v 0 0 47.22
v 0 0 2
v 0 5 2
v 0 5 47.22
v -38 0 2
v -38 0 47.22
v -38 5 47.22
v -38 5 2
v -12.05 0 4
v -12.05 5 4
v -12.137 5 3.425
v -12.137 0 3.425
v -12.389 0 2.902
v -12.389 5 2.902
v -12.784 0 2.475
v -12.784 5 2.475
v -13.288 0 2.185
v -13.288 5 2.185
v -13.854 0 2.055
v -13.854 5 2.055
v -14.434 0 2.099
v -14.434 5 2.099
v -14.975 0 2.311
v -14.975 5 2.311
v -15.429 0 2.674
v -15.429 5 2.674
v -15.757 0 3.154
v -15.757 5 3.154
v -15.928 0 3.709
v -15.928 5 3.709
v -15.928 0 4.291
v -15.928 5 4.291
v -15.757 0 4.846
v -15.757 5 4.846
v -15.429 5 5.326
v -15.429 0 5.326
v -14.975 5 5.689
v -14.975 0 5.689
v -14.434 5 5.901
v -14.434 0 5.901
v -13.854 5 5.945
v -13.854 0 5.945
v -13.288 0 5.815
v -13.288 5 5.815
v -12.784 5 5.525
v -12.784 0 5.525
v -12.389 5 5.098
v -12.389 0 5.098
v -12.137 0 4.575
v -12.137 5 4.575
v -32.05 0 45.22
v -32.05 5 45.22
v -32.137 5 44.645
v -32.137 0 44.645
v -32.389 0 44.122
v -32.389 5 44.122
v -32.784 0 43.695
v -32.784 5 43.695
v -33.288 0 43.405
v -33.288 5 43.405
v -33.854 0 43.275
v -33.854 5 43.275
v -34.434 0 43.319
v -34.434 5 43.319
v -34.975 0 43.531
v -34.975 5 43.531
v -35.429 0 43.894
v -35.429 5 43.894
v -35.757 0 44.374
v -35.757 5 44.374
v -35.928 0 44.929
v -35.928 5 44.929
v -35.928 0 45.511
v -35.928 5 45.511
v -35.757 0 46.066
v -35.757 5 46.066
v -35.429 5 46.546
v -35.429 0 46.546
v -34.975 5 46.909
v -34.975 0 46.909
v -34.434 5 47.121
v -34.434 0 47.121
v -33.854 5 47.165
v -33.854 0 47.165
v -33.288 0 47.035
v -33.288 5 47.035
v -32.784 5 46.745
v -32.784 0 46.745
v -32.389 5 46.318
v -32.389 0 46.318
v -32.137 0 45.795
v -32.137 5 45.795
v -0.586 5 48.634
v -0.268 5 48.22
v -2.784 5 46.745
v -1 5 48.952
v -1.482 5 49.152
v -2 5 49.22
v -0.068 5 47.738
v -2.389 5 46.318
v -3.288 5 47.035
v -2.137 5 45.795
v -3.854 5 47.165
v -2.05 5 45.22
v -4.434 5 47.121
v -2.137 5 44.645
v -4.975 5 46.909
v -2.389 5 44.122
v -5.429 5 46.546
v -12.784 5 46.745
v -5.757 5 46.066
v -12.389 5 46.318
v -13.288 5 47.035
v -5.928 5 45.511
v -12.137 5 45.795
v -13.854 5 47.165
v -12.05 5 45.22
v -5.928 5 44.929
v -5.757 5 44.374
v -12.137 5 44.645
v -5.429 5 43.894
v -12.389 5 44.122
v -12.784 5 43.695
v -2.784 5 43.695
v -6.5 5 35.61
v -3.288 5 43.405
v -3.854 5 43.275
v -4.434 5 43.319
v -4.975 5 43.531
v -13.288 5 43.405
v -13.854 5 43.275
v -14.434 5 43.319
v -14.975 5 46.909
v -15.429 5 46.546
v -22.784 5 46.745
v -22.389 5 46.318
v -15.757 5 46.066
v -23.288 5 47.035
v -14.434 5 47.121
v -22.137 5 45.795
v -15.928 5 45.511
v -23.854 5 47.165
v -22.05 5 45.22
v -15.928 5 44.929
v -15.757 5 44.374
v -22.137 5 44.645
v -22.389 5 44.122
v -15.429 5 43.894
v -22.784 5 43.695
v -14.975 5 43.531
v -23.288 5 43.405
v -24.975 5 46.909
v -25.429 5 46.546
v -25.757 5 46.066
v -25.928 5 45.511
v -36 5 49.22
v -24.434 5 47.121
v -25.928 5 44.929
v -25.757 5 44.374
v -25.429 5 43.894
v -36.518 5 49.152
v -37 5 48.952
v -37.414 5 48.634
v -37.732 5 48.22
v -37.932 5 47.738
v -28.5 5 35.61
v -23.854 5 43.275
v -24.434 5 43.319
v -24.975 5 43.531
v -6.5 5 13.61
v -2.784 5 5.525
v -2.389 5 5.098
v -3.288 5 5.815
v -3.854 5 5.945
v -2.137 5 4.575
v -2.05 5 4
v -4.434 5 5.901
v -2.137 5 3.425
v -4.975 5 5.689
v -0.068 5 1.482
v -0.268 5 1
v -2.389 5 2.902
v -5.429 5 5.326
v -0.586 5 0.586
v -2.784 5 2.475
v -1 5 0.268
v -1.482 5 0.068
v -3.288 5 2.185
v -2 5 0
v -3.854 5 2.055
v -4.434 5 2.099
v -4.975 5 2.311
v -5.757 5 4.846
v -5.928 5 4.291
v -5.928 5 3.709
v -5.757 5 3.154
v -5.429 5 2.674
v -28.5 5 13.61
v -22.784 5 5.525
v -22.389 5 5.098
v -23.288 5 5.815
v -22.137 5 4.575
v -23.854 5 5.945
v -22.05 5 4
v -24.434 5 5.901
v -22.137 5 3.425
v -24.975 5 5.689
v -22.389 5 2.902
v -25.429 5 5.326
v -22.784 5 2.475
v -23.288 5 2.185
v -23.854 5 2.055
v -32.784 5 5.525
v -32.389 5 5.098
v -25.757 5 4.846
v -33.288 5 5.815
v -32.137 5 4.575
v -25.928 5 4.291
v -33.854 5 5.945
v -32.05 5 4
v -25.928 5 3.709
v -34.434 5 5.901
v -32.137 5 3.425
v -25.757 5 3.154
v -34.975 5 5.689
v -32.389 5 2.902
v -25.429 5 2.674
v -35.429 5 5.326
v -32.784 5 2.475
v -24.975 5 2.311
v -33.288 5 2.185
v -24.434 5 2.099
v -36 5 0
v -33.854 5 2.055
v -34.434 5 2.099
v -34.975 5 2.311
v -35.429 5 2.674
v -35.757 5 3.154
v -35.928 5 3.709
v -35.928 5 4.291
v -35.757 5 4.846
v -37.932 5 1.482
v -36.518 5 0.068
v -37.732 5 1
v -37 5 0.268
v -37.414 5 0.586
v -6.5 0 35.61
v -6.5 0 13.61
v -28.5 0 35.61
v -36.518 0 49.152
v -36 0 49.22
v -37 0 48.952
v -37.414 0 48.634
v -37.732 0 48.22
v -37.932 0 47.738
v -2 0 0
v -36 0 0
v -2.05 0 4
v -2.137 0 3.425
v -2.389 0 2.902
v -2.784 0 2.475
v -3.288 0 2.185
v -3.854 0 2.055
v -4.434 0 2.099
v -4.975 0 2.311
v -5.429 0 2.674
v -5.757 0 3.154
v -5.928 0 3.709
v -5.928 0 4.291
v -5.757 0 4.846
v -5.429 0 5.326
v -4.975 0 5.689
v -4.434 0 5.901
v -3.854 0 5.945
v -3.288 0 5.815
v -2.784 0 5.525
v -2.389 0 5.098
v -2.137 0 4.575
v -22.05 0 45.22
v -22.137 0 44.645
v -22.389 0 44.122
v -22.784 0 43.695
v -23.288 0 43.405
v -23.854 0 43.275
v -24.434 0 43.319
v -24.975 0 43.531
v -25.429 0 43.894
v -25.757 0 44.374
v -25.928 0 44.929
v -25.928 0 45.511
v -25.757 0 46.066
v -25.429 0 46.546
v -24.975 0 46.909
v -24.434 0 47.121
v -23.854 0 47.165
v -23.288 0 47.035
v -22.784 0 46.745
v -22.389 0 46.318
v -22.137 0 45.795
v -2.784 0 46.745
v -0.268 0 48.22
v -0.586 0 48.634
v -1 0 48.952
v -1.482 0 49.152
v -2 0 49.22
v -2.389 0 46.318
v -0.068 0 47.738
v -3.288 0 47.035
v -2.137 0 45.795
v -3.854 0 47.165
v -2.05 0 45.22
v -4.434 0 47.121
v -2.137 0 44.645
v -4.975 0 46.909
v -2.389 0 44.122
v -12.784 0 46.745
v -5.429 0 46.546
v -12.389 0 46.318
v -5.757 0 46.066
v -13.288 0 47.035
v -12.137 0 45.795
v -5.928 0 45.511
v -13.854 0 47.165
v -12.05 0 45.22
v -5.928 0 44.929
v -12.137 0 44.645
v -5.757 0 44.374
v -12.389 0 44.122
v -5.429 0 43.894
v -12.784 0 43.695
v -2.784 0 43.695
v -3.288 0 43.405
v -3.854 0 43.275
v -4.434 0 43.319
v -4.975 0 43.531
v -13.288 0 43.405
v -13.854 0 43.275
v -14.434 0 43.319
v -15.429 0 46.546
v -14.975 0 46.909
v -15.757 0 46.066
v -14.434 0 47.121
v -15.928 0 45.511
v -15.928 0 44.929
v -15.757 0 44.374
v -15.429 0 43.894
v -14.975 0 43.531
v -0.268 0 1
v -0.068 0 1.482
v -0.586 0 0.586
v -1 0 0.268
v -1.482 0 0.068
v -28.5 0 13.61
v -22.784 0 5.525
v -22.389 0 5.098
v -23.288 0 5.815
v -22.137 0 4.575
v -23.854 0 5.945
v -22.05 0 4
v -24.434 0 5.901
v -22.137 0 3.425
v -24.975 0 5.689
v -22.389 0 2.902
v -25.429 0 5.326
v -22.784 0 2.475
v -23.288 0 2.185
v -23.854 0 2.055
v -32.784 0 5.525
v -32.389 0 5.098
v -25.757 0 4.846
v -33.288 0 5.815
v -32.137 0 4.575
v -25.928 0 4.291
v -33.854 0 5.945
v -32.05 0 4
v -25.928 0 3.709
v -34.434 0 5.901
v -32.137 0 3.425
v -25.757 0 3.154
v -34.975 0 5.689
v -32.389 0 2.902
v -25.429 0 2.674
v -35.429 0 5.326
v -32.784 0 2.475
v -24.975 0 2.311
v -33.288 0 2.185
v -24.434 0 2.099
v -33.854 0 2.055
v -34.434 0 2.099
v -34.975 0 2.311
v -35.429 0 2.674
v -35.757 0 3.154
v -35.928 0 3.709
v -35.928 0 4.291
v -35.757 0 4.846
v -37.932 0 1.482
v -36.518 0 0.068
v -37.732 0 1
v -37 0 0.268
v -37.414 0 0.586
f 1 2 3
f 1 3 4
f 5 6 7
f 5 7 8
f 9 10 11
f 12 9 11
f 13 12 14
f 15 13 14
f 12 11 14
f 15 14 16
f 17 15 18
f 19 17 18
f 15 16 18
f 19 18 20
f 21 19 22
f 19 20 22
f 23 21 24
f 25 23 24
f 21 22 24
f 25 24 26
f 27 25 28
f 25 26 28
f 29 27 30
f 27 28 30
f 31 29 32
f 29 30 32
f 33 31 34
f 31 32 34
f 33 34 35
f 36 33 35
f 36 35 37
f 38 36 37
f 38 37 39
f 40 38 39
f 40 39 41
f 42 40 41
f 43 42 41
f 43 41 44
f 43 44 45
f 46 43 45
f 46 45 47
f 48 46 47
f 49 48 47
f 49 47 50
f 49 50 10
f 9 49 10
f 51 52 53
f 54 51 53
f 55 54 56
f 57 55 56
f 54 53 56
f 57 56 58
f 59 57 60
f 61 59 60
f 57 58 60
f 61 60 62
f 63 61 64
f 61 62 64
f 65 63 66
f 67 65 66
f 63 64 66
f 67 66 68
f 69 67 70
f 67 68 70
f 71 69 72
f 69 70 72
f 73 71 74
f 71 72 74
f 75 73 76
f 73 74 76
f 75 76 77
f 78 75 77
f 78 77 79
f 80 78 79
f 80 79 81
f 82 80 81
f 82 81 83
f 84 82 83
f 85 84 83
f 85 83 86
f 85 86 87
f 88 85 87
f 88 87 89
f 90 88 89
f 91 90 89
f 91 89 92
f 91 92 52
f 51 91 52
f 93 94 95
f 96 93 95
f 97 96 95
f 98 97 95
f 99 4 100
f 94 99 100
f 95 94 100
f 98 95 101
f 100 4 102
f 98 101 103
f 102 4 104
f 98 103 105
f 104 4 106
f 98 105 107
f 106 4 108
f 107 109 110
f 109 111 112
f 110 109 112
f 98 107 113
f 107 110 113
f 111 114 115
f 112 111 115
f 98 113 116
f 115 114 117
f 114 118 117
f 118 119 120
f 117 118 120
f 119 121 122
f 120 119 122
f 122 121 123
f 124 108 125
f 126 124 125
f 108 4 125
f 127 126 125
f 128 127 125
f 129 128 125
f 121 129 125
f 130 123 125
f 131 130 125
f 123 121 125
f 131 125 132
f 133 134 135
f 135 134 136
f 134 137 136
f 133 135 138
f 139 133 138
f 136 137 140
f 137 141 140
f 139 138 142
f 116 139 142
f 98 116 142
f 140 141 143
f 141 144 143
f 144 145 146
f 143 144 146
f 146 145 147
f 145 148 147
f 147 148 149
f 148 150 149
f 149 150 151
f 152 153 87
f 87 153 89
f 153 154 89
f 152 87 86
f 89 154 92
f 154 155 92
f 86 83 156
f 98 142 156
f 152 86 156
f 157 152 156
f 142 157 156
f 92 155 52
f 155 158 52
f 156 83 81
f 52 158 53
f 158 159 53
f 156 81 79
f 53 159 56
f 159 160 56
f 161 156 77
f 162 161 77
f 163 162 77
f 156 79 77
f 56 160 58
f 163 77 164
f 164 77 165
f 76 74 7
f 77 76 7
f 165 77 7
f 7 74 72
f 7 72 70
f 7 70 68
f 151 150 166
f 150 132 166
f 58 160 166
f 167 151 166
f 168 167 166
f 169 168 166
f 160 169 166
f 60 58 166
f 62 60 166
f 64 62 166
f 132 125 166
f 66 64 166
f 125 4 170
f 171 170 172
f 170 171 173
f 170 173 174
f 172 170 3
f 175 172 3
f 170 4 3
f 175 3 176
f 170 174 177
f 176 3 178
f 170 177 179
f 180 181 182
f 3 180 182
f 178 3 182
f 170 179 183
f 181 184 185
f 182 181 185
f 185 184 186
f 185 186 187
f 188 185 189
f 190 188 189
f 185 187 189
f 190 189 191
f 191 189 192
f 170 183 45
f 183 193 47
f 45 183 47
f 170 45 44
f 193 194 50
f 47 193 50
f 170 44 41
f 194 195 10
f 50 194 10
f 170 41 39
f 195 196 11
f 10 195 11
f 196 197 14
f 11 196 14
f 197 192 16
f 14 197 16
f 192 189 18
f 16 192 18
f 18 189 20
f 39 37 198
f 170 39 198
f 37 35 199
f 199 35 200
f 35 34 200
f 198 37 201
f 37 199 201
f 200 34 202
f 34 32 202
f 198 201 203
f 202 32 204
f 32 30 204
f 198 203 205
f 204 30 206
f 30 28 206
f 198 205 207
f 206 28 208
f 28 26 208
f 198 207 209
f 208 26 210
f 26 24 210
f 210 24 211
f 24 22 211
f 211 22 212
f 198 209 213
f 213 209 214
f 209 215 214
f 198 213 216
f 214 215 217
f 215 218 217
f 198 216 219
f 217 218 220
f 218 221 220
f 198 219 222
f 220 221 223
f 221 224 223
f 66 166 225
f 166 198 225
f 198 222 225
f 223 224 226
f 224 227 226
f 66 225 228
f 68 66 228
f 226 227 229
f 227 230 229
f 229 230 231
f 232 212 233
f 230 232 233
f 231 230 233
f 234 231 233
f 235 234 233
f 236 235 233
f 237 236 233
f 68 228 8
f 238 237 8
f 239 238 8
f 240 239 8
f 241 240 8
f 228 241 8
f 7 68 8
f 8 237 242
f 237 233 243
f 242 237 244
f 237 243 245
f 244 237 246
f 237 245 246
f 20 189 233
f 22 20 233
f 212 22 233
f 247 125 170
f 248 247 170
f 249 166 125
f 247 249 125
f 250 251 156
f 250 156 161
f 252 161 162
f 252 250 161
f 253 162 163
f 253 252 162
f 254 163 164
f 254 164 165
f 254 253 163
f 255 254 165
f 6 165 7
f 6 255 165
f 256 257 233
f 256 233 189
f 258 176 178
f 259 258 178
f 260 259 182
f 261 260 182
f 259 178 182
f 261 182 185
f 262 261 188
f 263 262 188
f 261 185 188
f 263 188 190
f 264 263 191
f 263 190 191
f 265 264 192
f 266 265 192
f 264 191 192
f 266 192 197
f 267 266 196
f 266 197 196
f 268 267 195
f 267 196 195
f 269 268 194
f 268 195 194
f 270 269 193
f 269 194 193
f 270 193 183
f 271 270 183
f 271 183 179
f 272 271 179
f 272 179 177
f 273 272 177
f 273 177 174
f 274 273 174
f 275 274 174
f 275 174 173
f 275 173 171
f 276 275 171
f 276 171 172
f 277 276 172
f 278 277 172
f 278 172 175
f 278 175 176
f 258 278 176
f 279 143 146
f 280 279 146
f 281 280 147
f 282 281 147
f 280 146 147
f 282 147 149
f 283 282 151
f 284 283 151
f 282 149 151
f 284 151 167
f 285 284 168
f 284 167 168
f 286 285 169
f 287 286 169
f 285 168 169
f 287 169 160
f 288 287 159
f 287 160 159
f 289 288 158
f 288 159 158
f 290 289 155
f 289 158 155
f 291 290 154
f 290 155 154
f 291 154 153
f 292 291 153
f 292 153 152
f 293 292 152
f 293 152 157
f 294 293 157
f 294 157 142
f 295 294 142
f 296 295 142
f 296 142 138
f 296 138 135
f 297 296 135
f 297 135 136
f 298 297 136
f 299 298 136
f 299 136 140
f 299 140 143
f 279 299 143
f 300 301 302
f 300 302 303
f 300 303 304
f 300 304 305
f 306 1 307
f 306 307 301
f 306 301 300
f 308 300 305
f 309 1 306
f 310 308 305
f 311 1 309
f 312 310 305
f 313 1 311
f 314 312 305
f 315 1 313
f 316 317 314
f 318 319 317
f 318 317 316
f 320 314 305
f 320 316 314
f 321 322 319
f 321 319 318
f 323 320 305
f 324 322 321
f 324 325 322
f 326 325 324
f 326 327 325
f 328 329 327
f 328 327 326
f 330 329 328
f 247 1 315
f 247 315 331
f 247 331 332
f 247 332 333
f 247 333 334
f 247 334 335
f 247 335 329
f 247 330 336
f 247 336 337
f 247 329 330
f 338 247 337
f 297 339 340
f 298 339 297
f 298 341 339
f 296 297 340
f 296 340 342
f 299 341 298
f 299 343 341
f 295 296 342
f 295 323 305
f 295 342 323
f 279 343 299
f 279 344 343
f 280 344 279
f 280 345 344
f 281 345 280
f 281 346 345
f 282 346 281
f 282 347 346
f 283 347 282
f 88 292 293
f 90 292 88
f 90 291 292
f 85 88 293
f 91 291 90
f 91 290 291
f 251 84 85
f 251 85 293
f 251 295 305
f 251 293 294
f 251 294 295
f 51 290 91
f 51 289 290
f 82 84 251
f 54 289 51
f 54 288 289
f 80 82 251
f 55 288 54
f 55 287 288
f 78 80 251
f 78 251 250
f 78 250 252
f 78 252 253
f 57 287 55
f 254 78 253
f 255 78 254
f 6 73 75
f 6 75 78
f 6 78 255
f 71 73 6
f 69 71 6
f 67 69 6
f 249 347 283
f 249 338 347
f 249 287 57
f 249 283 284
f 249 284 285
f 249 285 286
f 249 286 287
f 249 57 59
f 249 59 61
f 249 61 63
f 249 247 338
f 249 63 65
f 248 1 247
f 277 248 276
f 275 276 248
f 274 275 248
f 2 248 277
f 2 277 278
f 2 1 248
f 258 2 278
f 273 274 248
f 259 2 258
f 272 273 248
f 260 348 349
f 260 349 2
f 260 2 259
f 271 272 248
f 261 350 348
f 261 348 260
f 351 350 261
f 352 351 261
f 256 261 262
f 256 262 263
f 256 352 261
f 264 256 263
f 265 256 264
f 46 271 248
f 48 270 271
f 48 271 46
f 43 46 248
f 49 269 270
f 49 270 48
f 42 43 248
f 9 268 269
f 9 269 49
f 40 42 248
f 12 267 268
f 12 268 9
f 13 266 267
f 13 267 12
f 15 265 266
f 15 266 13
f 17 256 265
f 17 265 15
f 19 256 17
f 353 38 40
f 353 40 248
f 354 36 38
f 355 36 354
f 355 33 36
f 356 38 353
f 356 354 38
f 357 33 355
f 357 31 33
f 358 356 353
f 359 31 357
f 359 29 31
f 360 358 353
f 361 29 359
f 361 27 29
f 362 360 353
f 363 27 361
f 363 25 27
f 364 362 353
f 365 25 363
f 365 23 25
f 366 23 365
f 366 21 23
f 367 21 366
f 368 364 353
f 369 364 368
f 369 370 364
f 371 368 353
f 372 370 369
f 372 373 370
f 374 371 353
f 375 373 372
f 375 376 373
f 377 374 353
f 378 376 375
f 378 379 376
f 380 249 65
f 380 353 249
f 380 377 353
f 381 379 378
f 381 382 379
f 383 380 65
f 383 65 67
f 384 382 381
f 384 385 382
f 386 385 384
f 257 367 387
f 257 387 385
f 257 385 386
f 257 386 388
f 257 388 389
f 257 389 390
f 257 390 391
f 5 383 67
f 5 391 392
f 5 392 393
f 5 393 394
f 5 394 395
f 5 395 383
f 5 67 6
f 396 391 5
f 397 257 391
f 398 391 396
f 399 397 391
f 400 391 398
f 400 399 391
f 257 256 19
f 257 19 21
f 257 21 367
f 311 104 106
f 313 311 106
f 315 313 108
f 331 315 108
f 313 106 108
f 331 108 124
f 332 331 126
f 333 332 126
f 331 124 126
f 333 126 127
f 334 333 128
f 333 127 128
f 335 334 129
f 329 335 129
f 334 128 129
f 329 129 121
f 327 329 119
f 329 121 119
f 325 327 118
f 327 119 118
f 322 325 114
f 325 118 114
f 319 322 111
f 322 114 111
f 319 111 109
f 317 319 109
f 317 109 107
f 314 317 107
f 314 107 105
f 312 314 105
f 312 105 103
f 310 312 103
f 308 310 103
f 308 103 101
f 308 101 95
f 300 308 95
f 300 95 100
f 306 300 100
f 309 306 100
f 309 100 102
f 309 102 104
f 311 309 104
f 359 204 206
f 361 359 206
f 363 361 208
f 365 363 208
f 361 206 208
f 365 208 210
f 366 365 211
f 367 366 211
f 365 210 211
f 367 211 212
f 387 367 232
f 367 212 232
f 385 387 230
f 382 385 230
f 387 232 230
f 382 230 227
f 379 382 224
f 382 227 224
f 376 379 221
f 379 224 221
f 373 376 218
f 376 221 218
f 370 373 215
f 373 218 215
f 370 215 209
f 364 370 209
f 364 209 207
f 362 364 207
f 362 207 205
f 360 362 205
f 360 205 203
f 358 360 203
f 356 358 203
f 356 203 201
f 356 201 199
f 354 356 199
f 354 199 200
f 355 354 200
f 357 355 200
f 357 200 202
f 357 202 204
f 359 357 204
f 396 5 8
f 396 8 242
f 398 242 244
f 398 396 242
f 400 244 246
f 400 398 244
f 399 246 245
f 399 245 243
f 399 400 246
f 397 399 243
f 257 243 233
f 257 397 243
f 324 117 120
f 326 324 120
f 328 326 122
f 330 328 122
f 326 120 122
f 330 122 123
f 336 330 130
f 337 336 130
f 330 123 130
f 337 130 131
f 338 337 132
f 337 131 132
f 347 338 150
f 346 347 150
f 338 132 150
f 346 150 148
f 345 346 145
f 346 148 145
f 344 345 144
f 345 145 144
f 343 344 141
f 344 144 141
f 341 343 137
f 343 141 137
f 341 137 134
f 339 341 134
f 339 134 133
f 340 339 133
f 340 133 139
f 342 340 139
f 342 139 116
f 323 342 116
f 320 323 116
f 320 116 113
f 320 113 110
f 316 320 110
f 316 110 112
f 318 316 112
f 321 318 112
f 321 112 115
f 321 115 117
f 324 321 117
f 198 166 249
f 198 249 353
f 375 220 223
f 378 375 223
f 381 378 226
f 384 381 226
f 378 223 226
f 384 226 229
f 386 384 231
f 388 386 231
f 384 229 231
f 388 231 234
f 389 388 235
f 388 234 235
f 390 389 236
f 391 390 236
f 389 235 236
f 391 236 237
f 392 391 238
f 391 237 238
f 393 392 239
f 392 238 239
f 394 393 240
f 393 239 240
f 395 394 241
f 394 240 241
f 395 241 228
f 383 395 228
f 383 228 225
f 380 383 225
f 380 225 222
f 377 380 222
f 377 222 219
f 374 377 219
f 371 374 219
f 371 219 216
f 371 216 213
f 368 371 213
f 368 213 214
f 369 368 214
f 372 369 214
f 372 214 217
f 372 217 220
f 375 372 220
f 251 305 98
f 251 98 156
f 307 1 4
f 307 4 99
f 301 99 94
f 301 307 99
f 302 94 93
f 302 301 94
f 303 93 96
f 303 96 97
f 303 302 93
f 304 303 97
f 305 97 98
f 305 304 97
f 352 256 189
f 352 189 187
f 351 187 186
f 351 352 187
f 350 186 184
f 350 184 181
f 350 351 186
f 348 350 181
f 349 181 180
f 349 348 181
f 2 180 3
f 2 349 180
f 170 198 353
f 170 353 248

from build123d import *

# Parameters (mm, degrees)
BOSS_EXTRUDE1_DEPTH = 5
SKETCH2_R           = 1.95
SKETCH2_W           = 22
SKETCH2_H           = 22
CUT_EXTRUDE1_DEPTH  = 6


with BuildPart() as part:
    # Sketch1 → Boss-Extrude1 (new body)
    with BuildSketch(Plane(origin=(0, 0, 0), x_dir=(1, 0, 0), z_dir=(0, 1, 0))):
        with BuildLine():
            Line((-36, 0), (-2, 0))
            ThreePointArc((-2, 0), (-0.585786438, -0.585786438), (0, -2))
            Line((0, -2), (0, -47.22))
            ThreePointArc((0, -47.22), (-0.585786438, -48.634213562), (-2, -49.22))
            Line((-2, -49.22), (-36, -49.22))
            ThreePointArc((-36, -49.22), (-37.414213562, -48.634213562), (-38, -47.22))
            Line((-38, -47.22), (-38, -2))
            ThreePointArc((-38, -2), (-37.414213562, -0.585786438), (-36, 0))
        make_face()
    extrude(amount=BOSS_EXTRUDE1_DEPTH)

    # Sketch2 → Cut-Extrude1 (cut, through all)
    with BuildSketch(Plane(origin=(0, 5, 0), x_dir=(1, 0, 0), z_dir=(0, 1, 0))):
        with Locations((-4, -4)):
            Circle(SKETCH2_R)
        with Locations((-14, -4)):
            Circle(SKETCH2_R)
        with Locations((-24, -4)):
            Circle(SKETCH2_R)
        with Locations((-54, -4)):
            Circle(SKETCH2_R)
        with Locations((-34, -4)):
            Circle(SKETCH2_R)
        with Locations((-44, -4)):
            Circle(SKETCH2_R)
        with Locations((-44, -45.22)):
            Circle(SKETCH2_R)
        with Locations((-34, -45.22)):
            Circle(SKETCH2_R)
        with Locations((-54, -45.22)):
            Circle(SKETCH2_R)
        with Locations((-24, -45.22)):
            Circle(SKETCH2_R)
        with Locations((-14, -45.22)):
            Circle(SKETCH2_R)
        with Locations((-4, -45.22)):
            Circle(SKETCH2_R)
        with Locations((-17.5, -24.61)):
            Rectangle(SKETCH2_W, SKETCH2_H)
    extrude(amount=-CUT_EXTRUDE1_DEPTH, mode=Mode.SUBTRACT)


solid = part.part
